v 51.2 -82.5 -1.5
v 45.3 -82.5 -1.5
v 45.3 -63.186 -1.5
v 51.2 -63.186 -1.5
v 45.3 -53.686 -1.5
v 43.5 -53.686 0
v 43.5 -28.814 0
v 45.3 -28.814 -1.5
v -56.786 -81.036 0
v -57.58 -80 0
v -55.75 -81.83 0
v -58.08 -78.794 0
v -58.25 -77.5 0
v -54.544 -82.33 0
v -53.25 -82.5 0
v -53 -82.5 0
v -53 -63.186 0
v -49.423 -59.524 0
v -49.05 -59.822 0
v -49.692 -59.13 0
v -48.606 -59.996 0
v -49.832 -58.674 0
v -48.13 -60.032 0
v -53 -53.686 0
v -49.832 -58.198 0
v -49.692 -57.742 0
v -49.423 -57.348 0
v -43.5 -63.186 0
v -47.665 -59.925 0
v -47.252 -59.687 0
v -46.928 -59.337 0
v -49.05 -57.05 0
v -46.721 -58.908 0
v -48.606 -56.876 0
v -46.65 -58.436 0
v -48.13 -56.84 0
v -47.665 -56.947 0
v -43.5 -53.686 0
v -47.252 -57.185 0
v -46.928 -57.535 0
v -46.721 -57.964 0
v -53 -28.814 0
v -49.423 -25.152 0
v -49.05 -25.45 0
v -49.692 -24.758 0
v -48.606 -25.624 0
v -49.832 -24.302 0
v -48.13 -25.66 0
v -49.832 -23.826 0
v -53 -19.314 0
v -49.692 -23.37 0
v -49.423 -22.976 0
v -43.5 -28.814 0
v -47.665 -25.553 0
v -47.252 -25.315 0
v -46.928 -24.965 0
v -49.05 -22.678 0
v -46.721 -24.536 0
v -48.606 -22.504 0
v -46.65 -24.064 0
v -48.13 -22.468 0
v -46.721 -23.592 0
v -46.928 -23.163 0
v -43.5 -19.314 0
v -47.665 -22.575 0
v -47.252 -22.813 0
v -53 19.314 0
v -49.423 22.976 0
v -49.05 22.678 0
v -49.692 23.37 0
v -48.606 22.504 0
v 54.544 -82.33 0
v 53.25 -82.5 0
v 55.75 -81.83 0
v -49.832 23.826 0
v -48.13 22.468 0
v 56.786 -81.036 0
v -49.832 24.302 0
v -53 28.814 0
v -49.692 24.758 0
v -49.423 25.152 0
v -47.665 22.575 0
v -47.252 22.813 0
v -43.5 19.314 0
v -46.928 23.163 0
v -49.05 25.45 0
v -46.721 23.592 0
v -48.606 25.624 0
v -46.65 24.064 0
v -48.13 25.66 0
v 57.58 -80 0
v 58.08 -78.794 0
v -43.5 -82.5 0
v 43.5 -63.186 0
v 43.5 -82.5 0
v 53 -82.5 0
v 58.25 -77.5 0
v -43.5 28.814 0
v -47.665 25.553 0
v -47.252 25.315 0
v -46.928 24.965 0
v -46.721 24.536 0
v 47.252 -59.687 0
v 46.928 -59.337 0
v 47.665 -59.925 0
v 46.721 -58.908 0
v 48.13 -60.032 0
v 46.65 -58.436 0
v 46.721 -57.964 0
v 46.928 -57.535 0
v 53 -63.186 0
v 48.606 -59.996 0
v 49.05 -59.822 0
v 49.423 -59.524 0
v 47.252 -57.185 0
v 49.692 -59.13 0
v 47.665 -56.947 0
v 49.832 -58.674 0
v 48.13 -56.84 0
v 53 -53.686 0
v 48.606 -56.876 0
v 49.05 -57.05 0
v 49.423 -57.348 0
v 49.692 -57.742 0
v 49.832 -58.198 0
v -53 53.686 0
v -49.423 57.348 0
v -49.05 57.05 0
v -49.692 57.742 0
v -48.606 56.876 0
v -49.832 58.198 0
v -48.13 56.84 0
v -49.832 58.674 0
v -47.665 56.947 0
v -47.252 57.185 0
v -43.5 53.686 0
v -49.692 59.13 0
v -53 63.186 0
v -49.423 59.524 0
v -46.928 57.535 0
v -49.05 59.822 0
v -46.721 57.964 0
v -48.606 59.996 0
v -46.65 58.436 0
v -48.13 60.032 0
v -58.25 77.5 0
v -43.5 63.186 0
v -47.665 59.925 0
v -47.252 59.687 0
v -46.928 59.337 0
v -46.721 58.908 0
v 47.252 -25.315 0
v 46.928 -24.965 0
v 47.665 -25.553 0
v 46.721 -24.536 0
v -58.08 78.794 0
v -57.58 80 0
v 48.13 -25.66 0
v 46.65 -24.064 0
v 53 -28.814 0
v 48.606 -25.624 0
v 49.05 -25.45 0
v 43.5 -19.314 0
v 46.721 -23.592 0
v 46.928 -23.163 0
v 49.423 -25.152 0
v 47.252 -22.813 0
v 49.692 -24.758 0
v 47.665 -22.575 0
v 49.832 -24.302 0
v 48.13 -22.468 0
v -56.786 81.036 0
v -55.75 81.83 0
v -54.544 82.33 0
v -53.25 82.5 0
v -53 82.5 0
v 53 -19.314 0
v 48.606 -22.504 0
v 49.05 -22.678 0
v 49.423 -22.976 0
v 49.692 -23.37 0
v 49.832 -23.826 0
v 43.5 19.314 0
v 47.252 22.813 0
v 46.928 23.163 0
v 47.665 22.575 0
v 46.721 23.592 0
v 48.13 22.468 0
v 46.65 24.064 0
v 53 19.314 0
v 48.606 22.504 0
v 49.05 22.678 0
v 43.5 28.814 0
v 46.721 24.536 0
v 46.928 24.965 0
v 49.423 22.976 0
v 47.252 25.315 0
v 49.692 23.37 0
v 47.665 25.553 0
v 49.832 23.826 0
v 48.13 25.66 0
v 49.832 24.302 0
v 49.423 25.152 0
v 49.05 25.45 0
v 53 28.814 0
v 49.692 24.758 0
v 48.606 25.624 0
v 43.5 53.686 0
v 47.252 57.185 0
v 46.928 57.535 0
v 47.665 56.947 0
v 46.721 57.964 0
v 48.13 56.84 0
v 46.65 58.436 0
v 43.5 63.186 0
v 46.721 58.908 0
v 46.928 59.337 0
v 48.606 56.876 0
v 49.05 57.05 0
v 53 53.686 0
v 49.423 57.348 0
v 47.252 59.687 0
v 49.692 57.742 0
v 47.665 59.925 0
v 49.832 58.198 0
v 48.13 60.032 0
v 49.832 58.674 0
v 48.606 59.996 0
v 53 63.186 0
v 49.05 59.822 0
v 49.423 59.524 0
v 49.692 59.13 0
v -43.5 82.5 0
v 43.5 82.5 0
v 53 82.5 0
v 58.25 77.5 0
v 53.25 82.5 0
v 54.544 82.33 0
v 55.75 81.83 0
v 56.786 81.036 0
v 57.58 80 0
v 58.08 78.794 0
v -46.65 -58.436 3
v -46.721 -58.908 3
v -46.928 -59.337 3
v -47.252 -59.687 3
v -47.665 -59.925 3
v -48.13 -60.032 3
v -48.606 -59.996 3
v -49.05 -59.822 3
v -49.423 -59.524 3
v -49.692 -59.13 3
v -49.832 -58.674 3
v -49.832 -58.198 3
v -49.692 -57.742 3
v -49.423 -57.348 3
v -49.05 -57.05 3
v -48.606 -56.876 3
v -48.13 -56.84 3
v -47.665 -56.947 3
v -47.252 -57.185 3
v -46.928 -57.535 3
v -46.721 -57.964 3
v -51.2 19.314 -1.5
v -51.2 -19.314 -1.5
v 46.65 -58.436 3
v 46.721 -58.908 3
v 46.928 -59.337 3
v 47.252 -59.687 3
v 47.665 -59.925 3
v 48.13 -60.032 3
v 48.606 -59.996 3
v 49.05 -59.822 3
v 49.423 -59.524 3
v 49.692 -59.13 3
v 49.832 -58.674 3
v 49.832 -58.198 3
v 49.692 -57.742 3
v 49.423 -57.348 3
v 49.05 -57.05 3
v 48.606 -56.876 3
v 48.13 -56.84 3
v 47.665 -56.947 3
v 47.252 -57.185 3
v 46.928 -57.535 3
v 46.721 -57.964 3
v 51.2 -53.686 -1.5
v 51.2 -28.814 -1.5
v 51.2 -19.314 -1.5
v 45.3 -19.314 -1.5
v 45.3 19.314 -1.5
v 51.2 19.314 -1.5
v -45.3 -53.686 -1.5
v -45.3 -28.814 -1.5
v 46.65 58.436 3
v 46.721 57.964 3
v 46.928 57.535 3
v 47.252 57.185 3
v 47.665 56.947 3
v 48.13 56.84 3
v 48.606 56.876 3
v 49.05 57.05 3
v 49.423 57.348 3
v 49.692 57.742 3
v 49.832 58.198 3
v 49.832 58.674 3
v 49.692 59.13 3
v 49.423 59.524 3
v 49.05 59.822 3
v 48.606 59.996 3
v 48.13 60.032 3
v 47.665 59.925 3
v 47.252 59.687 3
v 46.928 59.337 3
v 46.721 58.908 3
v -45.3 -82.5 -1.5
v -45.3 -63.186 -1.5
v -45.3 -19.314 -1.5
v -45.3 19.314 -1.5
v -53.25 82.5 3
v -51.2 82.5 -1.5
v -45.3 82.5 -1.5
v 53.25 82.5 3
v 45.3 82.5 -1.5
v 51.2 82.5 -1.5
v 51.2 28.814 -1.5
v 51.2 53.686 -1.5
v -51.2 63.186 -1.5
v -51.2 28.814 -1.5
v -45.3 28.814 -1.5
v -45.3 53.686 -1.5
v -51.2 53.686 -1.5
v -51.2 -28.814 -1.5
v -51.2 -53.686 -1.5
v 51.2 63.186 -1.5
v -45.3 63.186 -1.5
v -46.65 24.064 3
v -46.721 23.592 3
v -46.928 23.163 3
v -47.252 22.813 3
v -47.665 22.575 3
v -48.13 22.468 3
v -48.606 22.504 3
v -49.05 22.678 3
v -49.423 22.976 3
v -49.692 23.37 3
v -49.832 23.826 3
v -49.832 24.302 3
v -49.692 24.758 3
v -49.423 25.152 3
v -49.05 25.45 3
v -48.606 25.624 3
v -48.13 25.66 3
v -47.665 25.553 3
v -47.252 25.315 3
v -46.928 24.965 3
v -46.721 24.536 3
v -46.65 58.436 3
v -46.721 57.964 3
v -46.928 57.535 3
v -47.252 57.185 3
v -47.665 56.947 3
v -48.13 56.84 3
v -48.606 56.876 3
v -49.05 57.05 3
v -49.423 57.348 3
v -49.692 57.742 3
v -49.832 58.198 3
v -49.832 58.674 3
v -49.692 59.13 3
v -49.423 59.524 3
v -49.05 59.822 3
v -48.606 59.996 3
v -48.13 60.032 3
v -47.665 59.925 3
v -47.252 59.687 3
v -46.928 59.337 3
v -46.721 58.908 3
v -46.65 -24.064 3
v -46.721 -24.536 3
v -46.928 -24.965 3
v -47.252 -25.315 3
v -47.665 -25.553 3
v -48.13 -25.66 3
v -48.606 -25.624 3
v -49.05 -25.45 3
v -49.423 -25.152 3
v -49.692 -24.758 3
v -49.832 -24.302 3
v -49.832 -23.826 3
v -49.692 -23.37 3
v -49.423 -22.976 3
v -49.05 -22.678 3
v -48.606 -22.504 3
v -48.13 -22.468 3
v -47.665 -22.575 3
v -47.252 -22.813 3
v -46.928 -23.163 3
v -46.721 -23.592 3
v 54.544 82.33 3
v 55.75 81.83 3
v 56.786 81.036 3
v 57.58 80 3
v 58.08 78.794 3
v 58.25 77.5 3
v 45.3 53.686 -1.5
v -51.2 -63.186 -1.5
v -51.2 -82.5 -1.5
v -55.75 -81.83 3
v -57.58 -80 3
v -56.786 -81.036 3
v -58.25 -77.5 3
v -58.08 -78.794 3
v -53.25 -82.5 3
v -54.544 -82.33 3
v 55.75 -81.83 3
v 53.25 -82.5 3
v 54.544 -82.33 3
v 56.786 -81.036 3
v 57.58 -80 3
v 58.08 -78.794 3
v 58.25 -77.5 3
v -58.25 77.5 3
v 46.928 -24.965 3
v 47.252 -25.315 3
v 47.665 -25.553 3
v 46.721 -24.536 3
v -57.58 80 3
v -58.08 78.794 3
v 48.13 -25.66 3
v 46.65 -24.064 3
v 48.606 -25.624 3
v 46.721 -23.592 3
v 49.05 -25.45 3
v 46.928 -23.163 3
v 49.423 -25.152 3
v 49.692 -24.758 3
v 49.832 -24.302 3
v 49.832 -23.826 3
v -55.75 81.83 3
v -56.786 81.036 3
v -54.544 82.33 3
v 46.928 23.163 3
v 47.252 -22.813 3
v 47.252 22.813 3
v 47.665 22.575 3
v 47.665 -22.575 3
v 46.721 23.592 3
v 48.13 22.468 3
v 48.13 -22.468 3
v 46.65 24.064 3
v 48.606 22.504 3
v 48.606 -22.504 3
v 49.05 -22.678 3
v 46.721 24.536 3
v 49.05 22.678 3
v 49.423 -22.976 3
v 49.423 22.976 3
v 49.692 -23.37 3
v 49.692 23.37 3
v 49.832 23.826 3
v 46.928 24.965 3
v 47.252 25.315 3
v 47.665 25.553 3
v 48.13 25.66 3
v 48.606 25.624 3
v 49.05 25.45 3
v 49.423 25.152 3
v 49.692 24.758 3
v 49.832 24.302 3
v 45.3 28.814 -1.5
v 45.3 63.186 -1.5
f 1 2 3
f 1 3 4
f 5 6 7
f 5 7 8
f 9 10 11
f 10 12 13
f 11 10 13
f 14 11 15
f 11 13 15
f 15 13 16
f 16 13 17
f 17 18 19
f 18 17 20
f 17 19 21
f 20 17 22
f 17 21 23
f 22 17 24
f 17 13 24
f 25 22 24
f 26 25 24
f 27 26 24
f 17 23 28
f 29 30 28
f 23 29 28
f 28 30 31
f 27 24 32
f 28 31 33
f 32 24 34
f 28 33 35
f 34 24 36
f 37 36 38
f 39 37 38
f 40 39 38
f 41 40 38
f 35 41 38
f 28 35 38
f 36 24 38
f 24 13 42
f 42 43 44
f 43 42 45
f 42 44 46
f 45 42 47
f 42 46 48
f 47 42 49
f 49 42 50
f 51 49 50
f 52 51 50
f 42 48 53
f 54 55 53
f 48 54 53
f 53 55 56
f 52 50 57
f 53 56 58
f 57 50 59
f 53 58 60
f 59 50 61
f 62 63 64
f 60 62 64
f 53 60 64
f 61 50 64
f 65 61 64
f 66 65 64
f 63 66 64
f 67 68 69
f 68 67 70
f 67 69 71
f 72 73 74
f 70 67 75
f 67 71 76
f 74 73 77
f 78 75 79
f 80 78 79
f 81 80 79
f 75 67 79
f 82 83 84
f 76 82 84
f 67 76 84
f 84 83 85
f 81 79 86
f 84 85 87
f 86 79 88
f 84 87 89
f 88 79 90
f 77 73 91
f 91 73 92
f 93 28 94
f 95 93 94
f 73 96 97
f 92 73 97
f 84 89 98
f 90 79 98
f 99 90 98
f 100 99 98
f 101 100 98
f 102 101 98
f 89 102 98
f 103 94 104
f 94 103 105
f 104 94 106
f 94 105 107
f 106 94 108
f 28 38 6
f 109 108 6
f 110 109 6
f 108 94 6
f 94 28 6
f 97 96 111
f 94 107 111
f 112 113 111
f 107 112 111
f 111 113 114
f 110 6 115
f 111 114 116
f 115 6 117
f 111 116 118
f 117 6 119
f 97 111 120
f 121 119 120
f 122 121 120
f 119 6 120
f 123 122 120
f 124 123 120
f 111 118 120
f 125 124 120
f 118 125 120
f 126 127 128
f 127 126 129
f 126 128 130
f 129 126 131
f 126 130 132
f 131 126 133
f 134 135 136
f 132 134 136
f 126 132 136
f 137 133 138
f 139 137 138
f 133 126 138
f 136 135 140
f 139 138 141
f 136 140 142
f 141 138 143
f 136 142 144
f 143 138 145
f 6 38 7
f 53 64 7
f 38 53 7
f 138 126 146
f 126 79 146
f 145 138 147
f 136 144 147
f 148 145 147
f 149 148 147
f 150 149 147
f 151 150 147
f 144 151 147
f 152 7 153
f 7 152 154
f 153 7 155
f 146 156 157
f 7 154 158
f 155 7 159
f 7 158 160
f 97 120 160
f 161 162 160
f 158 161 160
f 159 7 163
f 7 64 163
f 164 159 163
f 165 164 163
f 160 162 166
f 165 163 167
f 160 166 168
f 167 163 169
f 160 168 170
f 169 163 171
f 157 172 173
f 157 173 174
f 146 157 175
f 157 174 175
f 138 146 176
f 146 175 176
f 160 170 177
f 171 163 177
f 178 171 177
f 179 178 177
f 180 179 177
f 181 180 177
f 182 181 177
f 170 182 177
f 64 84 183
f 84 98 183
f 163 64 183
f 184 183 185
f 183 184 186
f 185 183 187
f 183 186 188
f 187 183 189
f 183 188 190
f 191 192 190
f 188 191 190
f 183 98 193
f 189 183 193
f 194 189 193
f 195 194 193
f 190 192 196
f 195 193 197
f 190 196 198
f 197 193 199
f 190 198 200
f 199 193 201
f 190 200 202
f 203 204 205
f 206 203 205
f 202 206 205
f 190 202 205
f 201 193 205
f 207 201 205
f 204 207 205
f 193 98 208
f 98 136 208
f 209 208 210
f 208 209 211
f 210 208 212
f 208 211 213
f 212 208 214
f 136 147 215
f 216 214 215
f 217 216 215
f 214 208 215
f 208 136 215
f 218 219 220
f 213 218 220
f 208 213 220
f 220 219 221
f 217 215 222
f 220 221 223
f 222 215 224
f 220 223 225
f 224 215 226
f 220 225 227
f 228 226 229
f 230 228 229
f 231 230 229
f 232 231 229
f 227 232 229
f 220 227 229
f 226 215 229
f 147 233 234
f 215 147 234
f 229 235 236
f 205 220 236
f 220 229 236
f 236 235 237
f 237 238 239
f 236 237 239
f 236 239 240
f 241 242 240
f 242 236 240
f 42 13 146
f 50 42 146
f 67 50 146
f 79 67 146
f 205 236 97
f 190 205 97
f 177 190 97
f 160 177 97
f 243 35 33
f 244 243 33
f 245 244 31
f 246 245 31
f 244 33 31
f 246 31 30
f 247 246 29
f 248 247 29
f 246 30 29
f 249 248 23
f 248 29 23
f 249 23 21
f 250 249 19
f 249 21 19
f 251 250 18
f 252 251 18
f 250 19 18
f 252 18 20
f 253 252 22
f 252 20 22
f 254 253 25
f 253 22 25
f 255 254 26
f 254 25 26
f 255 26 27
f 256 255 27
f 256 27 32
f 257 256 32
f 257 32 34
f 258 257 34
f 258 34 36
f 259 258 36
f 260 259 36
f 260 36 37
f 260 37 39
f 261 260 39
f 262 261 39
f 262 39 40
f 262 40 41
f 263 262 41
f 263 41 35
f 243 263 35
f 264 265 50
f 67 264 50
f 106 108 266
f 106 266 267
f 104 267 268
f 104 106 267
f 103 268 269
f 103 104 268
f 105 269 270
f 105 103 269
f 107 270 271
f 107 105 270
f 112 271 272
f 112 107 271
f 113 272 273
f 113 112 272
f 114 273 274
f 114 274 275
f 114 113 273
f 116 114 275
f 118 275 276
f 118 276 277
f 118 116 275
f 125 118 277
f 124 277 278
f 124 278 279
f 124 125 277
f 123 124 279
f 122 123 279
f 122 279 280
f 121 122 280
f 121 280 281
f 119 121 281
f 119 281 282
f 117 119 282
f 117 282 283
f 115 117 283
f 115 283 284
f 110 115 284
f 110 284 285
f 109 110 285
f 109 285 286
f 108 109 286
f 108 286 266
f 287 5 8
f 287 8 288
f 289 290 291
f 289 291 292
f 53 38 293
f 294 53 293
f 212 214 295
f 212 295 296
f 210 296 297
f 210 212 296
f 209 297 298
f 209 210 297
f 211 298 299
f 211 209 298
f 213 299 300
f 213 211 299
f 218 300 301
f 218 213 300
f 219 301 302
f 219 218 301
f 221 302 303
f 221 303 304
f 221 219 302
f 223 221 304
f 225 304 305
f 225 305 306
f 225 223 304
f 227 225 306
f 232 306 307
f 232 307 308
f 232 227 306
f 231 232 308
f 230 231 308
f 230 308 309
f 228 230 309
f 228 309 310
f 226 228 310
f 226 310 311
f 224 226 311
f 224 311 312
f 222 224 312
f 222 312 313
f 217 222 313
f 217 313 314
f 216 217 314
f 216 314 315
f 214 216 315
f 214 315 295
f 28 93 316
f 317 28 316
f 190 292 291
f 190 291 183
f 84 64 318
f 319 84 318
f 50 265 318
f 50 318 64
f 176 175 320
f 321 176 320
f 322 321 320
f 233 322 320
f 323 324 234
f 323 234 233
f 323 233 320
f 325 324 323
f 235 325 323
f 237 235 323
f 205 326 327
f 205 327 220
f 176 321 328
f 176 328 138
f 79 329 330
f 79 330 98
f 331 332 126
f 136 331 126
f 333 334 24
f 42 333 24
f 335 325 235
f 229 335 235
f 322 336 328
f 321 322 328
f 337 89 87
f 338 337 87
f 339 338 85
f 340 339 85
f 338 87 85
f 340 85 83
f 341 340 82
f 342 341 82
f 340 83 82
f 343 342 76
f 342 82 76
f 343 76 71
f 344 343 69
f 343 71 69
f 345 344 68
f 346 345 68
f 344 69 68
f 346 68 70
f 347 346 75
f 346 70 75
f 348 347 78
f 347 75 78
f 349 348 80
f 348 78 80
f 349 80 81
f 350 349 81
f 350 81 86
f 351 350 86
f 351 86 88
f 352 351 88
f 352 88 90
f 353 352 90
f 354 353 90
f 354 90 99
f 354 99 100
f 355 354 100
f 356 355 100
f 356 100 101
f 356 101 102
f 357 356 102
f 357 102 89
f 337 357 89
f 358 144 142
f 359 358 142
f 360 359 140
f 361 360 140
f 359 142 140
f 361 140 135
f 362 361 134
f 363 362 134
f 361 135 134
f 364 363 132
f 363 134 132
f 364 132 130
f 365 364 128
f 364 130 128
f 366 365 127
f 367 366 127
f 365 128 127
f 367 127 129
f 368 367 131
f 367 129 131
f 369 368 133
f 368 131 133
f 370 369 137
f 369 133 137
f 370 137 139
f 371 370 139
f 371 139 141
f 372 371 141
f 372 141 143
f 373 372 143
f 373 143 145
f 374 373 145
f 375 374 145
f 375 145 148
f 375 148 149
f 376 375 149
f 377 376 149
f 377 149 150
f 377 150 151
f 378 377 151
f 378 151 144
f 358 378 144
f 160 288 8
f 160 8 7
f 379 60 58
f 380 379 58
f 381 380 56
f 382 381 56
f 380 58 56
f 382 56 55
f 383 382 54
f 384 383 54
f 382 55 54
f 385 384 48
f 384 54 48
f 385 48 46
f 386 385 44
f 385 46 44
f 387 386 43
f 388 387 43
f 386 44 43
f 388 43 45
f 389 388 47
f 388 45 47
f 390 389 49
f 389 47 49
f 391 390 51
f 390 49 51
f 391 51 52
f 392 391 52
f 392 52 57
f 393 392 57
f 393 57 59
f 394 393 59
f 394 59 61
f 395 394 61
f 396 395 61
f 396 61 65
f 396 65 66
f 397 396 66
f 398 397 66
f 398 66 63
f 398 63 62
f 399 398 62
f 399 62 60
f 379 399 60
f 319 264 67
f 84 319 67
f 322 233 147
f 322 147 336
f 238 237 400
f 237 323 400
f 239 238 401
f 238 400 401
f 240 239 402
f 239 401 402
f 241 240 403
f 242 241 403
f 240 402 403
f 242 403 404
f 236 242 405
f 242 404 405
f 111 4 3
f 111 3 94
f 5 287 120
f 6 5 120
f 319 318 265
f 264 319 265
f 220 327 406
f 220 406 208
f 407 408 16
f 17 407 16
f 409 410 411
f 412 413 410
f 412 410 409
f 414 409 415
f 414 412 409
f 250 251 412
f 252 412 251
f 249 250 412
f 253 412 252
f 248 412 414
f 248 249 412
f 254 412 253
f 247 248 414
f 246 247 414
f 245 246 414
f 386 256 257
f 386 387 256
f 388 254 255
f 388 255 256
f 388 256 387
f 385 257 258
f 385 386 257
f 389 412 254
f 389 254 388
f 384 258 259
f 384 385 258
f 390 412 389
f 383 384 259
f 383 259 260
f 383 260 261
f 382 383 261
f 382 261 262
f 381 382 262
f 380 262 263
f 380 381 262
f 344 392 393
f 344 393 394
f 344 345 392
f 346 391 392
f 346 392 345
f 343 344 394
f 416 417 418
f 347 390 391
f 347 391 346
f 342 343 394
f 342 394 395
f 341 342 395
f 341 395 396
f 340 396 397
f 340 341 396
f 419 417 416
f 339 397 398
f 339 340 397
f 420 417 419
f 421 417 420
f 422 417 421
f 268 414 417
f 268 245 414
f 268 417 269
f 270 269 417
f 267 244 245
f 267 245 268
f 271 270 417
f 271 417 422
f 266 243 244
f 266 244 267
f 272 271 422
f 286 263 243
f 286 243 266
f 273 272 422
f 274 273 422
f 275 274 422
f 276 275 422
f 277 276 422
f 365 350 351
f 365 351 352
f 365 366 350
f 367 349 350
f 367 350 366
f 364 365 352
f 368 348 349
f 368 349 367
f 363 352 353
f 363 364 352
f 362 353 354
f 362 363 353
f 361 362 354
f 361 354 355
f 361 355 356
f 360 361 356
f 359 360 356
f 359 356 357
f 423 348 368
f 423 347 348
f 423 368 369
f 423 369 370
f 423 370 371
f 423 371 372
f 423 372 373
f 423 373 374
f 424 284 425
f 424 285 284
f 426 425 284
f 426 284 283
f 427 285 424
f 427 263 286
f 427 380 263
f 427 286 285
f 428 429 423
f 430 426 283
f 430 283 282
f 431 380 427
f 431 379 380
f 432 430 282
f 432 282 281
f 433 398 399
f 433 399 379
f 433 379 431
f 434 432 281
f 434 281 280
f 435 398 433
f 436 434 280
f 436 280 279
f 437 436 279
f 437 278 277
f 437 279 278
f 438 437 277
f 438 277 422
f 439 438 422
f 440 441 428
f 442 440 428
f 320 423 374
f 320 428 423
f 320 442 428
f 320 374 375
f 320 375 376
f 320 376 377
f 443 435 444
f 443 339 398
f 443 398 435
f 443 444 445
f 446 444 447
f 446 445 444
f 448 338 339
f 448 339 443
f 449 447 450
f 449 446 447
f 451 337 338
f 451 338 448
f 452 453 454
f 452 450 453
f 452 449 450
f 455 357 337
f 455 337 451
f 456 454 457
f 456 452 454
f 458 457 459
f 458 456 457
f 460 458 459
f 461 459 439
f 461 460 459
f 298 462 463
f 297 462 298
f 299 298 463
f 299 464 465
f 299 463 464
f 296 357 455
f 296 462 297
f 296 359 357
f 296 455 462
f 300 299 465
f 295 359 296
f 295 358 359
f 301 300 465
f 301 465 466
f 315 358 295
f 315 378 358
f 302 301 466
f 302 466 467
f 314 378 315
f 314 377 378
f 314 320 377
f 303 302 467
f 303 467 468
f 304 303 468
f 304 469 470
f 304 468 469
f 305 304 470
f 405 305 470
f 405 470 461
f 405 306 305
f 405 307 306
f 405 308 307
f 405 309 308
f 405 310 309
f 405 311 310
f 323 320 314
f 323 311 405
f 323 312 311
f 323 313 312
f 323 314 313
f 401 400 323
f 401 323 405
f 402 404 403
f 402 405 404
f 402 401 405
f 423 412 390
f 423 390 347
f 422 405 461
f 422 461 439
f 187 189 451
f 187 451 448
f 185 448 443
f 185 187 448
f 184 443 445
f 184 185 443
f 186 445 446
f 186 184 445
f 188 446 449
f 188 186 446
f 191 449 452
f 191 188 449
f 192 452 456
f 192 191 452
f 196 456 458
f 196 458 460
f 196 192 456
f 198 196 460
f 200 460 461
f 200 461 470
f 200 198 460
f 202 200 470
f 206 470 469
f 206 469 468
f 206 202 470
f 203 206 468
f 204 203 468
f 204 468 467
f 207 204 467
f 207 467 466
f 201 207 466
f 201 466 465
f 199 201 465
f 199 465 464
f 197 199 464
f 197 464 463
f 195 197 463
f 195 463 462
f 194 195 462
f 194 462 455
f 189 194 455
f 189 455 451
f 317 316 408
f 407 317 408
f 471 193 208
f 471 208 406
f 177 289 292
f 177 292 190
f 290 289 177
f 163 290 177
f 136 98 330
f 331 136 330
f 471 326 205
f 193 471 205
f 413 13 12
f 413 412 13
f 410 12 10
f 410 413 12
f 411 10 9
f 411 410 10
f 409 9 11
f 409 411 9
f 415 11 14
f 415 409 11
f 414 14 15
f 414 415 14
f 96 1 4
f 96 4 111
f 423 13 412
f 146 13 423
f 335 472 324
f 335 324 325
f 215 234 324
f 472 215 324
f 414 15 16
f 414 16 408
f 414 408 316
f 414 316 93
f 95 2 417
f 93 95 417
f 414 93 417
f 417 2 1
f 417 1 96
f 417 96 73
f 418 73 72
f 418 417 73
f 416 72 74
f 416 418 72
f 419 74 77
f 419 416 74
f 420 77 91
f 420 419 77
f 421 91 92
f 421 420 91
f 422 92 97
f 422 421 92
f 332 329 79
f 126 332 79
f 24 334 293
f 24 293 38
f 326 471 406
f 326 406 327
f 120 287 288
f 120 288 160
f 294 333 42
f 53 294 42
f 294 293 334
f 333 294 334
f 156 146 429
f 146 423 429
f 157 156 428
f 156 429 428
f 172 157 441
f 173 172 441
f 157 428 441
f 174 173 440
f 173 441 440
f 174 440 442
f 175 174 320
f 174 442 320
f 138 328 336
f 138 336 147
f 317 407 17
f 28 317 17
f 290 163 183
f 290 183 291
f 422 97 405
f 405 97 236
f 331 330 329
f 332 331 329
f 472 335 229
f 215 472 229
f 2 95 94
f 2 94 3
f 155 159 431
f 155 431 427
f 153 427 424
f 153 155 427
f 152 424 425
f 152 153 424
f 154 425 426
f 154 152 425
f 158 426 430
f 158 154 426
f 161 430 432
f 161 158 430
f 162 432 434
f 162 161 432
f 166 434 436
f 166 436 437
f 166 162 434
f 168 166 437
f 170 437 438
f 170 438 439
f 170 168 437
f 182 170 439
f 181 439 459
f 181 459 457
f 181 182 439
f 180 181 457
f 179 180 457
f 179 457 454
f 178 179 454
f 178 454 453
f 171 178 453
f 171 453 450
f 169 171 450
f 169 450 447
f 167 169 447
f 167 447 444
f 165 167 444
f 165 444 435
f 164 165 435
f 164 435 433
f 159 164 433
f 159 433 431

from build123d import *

# Parameters (mm, degrees)
SKETCH_W        = 116.5
SKETCH_H        = 165
PAD_DEPTH       = 3
PAD001_DEPTH    = 165
SKETCH002_R     = 1.6
POCKET_DEPTH    = 4.5
SKETCH003_W     = 9.5
SKETCH003_H     = 9.5
POCKET001_DEPTH = 1.5
FILLET_R        = 5


with BuildPart() as part:
    # Sketch → Pad (new body)
    with BuildSketch(Plane.XY):
        Rectangle(SKETCH_W, SKETCH_H)
    extrude(amount=PAD_DEPTH)

    # Sketch001 (on Face3 of Pad) → Pad001 (join)
    with BuildSketch(Plane.XZ.offset(82.5)):
        Polygon((-53, 0), (-43.5, 0), (-45.3, -1.5), (-51.2, -1.5), align=None)
    pad001 = extrude(amount=-PAD001_DEPTH)

    # Sketch002 (on Face10 of Pad001) → Pocket (cut)
    with BuildSketch(Plane(origin=(0, 0, -1.5), x_dir=(1, 0, 0), z_dir=(0, 0, -1))):
        with Locations((-48.25, -24.064)):
            Circle(SKETCH002_R)
        with Locations((-48.25, -58.436)):
            Circle(SKETCH002_R)
        with Locations((-48.25, 58.436)):
            Circle(SKETCH002_R)
        with Locations((-48.25, 24.064)):
            Circle(SKETCH002_R)
    pocket = extrude(amount=-POCKET_DEPTH, mode=Mode.SUBTRACT)

    # Sketch003 (on Face10 of Pocket) → Pocket001 (cut)
    with BuildSketch(Plane(origin=(0, 0, -1.5), x_dir=(1, 0, 0), z_dir=(0, 0, -1))):
        with Locations((-48.25, 24.064)):
            Rectangle(SKETCH003_W, SKETCH003_H)
        with Locations((-48.25, 58.436)):
            Rectangle(SKETCH003_W, SKETCH003_H)
        with Locations((-48.25, -24.064)):
            Rectangle(SKETCH003_W, SKETCH003_H)
        with Locations((-48.25, -58.436)):
            Rectangle(SKETCH003_W, SKETCH003_H)
    pocket001 = extrude(amount=-POCKET001_DEPTH, mode=Mode.SUBTRACT)

    # Mirrored: Pad001, Pocket, Pocket001 across YZ
    add(pad001.mirror(Plane.YZ))
    add(pocket.mirror(Plane.YZ), mode=Mode.SUBTRACT)
    add(pocket001.mirror(Plane.YZ), mode=Mode.SUBTRACT)

    # Fillet
    fillet_edges = [part.edges().sort_by_distance(p)[0] for p in [
        (58.25, 82.5, 1.5),
        (-58.25, 82.5, 1.5),
        (58.25, -82.5, 1.5),
        (-58.25, -82.5, 1.5),
    ]]
    fillet(fillet_edges, radius=FILLET_R)


solid = part.part
